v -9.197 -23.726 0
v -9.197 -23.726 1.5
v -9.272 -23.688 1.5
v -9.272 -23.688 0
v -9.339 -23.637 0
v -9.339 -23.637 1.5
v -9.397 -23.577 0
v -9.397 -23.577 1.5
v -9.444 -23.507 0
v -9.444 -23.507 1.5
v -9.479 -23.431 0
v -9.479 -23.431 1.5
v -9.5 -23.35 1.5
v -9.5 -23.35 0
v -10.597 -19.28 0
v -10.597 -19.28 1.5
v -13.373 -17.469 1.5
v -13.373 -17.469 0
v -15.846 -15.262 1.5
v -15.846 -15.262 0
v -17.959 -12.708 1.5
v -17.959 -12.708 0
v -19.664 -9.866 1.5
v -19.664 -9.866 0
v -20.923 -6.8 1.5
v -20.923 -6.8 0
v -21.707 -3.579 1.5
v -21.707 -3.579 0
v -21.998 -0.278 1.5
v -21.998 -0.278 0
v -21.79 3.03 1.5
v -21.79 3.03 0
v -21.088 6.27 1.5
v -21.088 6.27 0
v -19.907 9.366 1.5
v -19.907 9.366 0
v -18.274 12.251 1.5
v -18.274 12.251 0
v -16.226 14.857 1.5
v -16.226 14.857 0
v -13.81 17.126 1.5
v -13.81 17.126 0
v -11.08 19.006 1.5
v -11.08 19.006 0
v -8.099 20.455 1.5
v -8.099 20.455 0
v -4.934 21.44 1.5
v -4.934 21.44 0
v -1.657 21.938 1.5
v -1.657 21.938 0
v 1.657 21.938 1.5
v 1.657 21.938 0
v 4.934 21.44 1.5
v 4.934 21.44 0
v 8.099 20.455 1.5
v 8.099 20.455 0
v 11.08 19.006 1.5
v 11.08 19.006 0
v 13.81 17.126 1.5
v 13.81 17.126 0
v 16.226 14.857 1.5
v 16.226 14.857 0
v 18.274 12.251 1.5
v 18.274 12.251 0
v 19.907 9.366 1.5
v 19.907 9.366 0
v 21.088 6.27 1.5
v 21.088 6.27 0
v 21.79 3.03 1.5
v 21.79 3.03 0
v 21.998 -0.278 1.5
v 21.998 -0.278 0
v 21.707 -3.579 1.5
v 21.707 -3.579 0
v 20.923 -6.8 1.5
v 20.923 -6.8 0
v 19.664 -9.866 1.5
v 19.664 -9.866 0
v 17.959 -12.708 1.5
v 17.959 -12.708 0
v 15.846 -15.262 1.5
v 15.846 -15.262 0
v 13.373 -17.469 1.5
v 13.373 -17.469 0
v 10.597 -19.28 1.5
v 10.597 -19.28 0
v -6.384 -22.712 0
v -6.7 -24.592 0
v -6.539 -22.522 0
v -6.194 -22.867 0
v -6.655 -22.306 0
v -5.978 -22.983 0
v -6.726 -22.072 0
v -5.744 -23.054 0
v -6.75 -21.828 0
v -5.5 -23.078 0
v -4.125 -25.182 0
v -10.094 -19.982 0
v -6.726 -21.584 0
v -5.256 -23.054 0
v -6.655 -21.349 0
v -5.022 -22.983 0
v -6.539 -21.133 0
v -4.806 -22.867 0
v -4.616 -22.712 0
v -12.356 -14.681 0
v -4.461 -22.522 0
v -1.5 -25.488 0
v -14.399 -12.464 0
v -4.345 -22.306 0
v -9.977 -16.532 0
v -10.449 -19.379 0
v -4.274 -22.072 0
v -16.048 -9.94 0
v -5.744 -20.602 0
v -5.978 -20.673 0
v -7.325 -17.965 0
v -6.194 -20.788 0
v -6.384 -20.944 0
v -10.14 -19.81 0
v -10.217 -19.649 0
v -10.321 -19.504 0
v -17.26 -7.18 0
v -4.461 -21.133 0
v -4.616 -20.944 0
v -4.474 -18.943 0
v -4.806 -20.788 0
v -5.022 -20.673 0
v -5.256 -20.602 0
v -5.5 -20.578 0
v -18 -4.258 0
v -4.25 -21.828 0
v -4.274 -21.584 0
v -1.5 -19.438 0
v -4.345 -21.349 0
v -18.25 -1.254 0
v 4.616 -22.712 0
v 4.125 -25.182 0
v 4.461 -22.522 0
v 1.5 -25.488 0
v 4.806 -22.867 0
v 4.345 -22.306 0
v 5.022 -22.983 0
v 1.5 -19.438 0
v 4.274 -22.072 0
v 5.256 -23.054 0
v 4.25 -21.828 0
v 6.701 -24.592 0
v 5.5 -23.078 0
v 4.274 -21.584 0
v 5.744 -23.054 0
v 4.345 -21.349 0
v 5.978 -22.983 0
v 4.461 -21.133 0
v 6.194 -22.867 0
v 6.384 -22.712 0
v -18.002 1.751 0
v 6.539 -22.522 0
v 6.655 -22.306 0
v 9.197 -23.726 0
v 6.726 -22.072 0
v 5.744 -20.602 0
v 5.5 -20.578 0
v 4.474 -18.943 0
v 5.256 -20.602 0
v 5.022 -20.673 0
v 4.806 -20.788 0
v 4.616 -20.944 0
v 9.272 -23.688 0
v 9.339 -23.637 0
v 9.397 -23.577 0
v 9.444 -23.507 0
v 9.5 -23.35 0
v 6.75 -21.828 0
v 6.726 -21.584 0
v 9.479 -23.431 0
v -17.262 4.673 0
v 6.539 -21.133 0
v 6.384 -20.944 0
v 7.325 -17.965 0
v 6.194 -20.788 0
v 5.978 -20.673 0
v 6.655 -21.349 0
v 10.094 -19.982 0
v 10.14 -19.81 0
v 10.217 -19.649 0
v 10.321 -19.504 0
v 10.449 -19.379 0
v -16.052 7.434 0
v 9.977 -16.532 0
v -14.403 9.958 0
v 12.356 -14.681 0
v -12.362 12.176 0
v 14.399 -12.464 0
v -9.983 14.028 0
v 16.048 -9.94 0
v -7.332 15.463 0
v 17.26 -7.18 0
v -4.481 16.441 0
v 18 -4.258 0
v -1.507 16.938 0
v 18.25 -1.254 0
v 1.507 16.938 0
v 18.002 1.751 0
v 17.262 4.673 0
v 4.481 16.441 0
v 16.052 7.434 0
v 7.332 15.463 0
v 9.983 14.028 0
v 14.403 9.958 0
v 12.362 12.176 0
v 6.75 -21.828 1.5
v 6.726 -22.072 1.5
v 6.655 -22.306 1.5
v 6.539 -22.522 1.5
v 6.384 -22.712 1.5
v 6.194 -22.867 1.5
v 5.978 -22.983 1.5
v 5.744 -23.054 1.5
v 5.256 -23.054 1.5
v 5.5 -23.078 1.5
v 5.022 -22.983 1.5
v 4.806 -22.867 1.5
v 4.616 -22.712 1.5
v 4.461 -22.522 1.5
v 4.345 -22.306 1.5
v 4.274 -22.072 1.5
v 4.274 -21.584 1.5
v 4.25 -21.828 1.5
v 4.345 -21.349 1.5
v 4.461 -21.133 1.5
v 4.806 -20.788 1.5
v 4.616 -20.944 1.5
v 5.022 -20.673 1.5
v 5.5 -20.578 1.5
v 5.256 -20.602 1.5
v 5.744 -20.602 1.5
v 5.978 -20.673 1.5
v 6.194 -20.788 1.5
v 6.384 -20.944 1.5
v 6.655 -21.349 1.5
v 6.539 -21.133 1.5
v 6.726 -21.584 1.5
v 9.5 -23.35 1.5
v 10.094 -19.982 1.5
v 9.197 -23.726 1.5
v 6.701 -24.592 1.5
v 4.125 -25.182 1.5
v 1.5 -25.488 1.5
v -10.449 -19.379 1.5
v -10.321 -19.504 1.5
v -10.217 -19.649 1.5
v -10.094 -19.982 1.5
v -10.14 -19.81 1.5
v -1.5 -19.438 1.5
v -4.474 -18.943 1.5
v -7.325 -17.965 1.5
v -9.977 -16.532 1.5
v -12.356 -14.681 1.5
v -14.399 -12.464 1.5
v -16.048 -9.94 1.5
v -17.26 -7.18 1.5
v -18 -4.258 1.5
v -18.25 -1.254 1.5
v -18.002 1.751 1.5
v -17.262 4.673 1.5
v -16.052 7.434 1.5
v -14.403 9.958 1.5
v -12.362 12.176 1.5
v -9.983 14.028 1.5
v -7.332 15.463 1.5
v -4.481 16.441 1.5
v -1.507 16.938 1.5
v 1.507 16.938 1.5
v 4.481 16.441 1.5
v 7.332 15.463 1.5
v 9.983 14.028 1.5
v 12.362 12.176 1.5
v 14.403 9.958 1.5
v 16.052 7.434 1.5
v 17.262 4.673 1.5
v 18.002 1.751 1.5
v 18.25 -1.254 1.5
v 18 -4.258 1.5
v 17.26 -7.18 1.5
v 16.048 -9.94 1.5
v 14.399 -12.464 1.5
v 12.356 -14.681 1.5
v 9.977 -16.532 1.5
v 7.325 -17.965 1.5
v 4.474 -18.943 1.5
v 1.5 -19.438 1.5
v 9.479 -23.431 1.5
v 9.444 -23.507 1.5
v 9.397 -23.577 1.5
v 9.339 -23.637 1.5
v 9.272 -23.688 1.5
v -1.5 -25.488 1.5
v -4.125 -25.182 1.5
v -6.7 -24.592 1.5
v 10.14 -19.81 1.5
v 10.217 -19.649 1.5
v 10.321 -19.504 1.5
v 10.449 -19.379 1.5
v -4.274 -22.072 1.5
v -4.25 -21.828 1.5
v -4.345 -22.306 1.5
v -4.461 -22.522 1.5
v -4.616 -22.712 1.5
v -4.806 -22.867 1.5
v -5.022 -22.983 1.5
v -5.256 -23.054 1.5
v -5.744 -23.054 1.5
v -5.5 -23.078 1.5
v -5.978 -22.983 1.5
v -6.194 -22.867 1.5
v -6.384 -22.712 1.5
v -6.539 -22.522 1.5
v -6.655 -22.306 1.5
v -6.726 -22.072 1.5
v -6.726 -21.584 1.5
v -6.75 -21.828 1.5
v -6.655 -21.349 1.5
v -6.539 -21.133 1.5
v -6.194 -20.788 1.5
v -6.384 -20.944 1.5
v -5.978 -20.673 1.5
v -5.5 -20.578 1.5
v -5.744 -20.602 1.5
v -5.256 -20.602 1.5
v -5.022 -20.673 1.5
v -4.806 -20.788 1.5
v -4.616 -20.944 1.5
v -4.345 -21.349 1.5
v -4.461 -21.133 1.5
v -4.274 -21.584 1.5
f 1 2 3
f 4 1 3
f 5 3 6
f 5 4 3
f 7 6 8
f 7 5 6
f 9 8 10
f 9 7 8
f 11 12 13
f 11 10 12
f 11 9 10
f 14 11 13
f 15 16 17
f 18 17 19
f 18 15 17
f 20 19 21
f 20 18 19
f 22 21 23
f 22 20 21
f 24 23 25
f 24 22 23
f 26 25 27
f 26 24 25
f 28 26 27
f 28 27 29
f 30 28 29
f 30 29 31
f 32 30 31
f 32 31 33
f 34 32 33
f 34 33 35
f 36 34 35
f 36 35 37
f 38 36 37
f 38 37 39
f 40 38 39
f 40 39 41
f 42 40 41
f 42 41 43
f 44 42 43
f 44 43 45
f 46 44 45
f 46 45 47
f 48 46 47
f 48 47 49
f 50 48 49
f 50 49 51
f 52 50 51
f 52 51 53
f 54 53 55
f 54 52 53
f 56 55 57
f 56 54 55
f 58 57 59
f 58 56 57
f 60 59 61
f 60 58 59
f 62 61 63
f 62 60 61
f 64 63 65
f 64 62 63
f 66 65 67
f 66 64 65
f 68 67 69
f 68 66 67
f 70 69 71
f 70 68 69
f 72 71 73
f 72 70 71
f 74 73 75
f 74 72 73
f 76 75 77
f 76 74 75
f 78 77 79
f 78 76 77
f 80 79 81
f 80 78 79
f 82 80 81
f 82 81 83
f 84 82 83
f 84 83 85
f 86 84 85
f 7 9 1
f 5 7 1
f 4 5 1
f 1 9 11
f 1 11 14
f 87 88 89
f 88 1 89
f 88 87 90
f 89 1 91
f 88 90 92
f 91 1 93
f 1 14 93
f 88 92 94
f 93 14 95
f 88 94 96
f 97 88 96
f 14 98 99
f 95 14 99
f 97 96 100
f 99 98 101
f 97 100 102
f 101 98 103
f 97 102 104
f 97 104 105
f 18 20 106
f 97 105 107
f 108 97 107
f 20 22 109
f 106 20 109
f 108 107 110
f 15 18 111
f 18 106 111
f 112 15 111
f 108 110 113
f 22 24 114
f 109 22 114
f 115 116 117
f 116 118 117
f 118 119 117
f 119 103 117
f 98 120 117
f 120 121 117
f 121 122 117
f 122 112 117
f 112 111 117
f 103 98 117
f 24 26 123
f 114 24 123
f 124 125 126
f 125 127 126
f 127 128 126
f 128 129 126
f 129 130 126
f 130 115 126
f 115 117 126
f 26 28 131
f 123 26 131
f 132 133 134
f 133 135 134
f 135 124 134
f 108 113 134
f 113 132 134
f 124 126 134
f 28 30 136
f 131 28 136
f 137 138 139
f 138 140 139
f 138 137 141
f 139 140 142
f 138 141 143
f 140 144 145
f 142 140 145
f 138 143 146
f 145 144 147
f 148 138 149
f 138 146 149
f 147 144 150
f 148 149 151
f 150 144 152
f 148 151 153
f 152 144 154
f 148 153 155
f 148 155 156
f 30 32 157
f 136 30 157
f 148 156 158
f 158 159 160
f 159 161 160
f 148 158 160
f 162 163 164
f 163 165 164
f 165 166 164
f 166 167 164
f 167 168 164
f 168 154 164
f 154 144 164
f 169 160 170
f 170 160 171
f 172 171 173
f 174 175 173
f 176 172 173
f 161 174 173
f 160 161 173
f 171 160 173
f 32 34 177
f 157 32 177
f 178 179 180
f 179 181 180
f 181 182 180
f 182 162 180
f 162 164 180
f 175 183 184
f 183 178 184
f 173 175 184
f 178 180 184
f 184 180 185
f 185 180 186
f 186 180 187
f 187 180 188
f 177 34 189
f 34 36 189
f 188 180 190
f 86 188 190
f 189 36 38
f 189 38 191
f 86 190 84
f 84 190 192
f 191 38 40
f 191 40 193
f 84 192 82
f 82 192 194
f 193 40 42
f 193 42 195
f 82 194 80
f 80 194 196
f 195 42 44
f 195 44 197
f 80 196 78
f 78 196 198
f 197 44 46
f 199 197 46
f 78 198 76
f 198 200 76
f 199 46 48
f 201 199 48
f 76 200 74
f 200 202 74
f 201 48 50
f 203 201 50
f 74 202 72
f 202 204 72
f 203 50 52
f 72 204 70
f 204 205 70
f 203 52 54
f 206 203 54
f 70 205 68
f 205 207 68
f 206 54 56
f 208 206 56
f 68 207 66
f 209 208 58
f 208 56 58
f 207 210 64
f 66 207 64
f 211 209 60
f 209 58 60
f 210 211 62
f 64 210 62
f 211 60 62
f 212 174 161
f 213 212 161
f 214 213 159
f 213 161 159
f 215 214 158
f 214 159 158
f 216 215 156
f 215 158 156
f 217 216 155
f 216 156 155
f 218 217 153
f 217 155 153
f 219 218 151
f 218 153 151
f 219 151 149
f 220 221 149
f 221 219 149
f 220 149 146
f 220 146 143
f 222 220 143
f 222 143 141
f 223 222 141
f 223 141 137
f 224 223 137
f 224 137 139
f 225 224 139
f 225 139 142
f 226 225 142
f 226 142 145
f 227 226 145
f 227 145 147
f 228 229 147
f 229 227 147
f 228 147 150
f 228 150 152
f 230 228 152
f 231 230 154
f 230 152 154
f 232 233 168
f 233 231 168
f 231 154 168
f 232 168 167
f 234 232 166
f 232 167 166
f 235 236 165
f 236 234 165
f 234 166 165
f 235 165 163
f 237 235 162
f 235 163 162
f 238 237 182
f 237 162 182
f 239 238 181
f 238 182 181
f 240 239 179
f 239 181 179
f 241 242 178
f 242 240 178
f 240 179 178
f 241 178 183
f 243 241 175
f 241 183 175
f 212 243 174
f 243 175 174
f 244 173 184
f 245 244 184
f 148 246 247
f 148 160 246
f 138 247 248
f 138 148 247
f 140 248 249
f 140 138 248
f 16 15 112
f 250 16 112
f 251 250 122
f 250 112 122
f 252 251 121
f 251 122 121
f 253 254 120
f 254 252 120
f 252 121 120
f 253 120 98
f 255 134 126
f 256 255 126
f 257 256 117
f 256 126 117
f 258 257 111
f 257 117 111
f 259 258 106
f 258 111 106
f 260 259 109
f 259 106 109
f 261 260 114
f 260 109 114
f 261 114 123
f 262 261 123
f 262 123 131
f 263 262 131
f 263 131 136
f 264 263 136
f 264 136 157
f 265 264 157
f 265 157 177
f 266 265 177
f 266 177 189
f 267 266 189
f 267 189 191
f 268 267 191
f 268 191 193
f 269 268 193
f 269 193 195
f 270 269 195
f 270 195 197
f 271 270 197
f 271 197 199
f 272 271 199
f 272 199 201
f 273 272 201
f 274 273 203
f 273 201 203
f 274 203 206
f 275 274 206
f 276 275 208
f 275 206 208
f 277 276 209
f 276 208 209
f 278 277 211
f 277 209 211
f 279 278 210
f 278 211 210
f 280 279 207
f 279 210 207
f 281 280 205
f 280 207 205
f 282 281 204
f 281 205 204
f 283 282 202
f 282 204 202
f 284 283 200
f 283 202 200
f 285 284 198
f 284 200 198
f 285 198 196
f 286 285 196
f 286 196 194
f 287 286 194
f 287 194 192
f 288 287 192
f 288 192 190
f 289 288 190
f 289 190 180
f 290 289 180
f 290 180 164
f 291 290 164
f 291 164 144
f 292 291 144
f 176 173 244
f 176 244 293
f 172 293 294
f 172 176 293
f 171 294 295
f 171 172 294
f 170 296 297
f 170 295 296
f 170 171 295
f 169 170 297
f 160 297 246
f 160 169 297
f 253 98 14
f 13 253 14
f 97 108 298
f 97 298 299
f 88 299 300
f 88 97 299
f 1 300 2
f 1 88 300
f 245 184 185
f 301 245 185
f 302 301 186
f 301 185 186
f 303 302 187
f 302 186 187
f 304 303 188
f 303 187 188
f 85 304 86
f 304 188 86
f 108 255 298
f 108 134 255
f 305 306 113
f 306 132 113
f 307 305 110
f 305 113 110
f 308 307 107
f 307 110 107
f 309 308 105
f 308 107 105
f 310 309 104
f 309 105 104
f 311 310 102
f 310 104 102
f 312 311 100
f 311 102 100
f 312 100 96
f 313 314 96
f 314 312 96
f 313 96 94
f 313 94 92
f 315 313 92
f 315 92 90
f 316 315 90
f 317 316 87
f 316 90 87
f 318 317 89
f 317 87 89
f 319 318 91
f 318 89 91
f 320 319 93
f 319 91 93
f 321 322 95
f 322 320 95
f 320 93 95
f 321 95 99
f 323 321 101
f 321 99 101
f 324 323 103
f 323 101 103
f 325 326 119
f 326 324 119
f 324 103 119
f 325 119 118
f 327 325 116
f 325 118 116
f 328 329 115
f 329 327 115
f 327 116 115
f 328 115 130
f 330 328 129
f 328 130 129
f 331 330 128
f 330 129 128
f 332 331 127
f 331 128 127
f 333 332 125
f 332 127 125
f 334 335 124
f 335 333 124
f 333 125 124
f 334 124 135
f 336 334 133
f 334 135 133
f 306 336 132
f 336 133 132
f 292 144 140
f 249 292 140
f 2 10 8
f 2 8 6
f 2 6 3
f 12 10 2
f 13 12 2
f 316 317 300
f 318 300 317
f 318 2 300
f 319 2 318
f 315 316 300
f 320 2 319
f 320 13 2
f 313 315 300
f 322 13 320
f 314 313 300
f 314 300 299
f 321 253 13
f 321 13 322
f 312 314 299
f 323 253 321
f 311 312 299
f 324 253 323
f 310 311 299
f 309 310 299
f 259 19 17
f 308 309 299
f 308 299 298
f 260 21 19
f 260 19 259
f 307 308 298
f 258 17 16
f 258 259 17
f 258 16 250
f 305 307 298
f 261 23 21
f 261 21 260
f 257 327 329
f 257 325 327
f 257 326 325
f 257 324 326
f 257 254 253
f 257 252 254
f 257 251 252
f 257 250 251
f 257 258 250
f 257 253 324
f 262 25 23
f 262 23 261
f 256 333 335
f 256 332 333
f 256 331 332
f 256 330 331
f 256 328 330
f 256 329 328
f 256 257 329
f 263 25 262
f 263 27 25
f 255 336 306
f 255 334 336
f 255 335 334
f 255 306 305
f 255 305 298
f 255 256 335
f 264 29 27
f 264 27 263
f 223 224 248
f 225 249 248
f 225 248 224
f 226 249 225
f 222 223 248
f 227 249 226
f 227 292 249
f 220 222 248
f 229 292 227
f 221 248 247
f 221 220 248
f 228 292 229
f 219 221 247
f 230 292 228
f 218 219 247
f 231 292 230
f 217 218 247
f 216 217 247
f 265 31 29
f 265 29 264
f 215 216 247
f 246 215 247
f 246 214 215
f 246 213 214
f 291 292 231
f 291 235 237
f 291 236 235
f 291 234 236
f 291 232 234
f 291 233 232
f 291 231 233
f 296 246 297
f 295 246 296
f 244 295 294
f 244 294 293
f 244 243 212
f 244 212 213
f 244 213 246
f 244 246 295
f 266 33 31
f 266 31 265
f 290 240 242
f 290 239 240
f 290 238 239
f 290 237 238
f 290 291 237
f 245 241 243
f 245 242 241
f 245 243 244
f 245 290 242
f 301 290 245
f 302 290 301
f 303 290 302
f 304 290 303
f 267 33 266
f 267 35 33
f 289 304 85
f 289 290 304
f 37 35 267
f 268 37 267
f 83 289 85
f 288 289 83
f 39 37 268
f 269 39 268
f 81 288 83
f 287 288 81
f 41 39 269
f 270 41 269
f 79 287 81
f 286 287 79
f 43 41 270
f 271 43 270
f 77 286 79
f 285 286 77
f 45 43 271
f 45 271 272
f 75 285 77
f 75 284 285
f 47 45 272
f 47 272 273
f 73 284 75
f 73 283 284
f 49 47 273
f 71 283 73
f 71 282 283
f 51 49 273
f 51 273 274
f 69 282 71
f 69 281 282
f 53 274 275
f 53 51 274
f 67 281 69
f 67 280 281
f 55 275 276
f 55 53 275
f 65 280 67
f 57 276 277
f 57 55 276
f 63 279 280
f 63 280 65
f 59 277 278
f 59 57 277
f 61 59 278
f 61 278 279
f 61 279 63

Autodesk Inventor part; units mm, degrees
ref_plane "YZ Plane" through (0, 0, 0) normal (1, 0, 0) x (0, 1, 0)
ref_plane "XZ Plane" through (0, 0, 0) normal (0, 1, 0) x (-1, 0, 0)
sketch "草图1" plane through (0, 0, 0) normal (0, 0, 1) x (1, 0, 0)
  arc A0 (1.5, -19.4383) -> (-1.5, -19.4383) centre (0, -1.25) ccw
  line L0 (0, 47.3657) -> (0, -51.0943) projected
  line L1 (-46.62, 0) -> (46.62, 0) projected
  line L2 (-1.5, -19.4383) -> (-1.5, -25.4883)
  line L3 (-1.5, -6.5402) -> (-1.5, -13.29) construction
  line L4 (-2.7947, 22) -> (3.6722, 22) construction
  arc A1 (10.5969, -19.2797) -> (-10.5969, -19.2797) centre (0, 0) ccw
  arc A2 (-9.197, -23.7257) -> (-1.5, -25.4883) centre (0, -1.25) ccw
  arc A3 (-9.5, -23.3498) -> (-9.197, -23.7257) centre (-9.0076, -23.263) ccw
  arc A4 (-10.0938, -19.9824) -> (-10.5969, -19.2797) centre (-11.0786, -20.156) ccw
  line L5 (1.5, -19.4383) -> (1.5, -25.4883)
  line L6 (1.5, -6.5402) -> (1.5, -13.29) construction
  arc A5 (1.5, -25.4883) -> (9.197, -23.7257) centre (0, -1.25) ccw
  arc A6 (9.197, -23.7257) -> (9.5, -23.3498) centre (9.0076, -23.263) ccw
  circle A7 centre (-5.5, -21.8277) radius 1.25
  circle A8 centre (5.5, -21.8277) radius 1.25
  line L7 (-10.0938, -19.9824) -> (-9.5, -23.3498)
  arc A9 (10.5969, -19.2797) -> (10.0938, -19.9824) centre (11.0786, -20.156) ccw
  line L8 (9.5, -23.3498) -> (10.0938, -19.9824)
  arc A10 (-2.7484, -22.3719) -> (3.183, -22.3108) centre (0, -1.25) ccw construction
  dimension "d0" = 36.5
  dimension "d1" = 6.05
  dimension "d6" = 1.5
  dimension "d8" = 1.25
  dimension "d9" = 0.5
  dimension "d10" = 1
  dimension "d12" = 2.5
  dimension "d13" = 2.5
  dimension "d43" = 10
  dimension "d44" = 21.3
  dimension "d45" = 11
  dimension "d46" = 19
  dimension "d47" = 5
extrude "轴承体" add sketch "草图1" along normal blind 1.5 contours A0 L1 A1 A9 L8 A6 A5 L5 | A0 L0 A1 L1 | A0 L1 A1 L0 | A0 L2 A2 A3 L7 A4 A1 L1
ref_plane "Work Plane1" through (0, -1.25, 0) normal (1, 0, 0) x (0, 0, 1)
equation "\"d0\" = ND"
equation "\"d1\" = SRB2"
equation "\"d6\" = 0.5 * B1"
equation "\"d8\" = C1"
equation "\"d9\" = R3"
equation "\"d10\" = R2"
equation "\"d12\" = SD5"
equation "\"d13\" = SD5"
equation "\"d44\" = R1"
equation "\"d45\" = B2"
equation "\"d46\" = L"
equation "\"d47\" = SRB1"
equation "\"d2\" = SD"
equation "\"SD\" = 1.5"
equation "\"SRB1\" = 5"
equation "\"ND\" = 36.5"
equation "\"SRB2\" = 6.05"
equation "\"SD5\" = 2.5"
equation "\"B1\" = 3"
equation "\"R2\" = 1"
equation "\"R3\" = 0.5"
equation "\"B2\" = 11"
equation "\"R1\" = 21.3"
equation "\"C1\" = 1.25"
equation "\"SD3\" = 36.5"
equation "\"WDMAX\" = 42"
equation "\"H1\" = 0"
properties part number "弹性挡圈GB 894.1-86 - 40" material "钢，软"
